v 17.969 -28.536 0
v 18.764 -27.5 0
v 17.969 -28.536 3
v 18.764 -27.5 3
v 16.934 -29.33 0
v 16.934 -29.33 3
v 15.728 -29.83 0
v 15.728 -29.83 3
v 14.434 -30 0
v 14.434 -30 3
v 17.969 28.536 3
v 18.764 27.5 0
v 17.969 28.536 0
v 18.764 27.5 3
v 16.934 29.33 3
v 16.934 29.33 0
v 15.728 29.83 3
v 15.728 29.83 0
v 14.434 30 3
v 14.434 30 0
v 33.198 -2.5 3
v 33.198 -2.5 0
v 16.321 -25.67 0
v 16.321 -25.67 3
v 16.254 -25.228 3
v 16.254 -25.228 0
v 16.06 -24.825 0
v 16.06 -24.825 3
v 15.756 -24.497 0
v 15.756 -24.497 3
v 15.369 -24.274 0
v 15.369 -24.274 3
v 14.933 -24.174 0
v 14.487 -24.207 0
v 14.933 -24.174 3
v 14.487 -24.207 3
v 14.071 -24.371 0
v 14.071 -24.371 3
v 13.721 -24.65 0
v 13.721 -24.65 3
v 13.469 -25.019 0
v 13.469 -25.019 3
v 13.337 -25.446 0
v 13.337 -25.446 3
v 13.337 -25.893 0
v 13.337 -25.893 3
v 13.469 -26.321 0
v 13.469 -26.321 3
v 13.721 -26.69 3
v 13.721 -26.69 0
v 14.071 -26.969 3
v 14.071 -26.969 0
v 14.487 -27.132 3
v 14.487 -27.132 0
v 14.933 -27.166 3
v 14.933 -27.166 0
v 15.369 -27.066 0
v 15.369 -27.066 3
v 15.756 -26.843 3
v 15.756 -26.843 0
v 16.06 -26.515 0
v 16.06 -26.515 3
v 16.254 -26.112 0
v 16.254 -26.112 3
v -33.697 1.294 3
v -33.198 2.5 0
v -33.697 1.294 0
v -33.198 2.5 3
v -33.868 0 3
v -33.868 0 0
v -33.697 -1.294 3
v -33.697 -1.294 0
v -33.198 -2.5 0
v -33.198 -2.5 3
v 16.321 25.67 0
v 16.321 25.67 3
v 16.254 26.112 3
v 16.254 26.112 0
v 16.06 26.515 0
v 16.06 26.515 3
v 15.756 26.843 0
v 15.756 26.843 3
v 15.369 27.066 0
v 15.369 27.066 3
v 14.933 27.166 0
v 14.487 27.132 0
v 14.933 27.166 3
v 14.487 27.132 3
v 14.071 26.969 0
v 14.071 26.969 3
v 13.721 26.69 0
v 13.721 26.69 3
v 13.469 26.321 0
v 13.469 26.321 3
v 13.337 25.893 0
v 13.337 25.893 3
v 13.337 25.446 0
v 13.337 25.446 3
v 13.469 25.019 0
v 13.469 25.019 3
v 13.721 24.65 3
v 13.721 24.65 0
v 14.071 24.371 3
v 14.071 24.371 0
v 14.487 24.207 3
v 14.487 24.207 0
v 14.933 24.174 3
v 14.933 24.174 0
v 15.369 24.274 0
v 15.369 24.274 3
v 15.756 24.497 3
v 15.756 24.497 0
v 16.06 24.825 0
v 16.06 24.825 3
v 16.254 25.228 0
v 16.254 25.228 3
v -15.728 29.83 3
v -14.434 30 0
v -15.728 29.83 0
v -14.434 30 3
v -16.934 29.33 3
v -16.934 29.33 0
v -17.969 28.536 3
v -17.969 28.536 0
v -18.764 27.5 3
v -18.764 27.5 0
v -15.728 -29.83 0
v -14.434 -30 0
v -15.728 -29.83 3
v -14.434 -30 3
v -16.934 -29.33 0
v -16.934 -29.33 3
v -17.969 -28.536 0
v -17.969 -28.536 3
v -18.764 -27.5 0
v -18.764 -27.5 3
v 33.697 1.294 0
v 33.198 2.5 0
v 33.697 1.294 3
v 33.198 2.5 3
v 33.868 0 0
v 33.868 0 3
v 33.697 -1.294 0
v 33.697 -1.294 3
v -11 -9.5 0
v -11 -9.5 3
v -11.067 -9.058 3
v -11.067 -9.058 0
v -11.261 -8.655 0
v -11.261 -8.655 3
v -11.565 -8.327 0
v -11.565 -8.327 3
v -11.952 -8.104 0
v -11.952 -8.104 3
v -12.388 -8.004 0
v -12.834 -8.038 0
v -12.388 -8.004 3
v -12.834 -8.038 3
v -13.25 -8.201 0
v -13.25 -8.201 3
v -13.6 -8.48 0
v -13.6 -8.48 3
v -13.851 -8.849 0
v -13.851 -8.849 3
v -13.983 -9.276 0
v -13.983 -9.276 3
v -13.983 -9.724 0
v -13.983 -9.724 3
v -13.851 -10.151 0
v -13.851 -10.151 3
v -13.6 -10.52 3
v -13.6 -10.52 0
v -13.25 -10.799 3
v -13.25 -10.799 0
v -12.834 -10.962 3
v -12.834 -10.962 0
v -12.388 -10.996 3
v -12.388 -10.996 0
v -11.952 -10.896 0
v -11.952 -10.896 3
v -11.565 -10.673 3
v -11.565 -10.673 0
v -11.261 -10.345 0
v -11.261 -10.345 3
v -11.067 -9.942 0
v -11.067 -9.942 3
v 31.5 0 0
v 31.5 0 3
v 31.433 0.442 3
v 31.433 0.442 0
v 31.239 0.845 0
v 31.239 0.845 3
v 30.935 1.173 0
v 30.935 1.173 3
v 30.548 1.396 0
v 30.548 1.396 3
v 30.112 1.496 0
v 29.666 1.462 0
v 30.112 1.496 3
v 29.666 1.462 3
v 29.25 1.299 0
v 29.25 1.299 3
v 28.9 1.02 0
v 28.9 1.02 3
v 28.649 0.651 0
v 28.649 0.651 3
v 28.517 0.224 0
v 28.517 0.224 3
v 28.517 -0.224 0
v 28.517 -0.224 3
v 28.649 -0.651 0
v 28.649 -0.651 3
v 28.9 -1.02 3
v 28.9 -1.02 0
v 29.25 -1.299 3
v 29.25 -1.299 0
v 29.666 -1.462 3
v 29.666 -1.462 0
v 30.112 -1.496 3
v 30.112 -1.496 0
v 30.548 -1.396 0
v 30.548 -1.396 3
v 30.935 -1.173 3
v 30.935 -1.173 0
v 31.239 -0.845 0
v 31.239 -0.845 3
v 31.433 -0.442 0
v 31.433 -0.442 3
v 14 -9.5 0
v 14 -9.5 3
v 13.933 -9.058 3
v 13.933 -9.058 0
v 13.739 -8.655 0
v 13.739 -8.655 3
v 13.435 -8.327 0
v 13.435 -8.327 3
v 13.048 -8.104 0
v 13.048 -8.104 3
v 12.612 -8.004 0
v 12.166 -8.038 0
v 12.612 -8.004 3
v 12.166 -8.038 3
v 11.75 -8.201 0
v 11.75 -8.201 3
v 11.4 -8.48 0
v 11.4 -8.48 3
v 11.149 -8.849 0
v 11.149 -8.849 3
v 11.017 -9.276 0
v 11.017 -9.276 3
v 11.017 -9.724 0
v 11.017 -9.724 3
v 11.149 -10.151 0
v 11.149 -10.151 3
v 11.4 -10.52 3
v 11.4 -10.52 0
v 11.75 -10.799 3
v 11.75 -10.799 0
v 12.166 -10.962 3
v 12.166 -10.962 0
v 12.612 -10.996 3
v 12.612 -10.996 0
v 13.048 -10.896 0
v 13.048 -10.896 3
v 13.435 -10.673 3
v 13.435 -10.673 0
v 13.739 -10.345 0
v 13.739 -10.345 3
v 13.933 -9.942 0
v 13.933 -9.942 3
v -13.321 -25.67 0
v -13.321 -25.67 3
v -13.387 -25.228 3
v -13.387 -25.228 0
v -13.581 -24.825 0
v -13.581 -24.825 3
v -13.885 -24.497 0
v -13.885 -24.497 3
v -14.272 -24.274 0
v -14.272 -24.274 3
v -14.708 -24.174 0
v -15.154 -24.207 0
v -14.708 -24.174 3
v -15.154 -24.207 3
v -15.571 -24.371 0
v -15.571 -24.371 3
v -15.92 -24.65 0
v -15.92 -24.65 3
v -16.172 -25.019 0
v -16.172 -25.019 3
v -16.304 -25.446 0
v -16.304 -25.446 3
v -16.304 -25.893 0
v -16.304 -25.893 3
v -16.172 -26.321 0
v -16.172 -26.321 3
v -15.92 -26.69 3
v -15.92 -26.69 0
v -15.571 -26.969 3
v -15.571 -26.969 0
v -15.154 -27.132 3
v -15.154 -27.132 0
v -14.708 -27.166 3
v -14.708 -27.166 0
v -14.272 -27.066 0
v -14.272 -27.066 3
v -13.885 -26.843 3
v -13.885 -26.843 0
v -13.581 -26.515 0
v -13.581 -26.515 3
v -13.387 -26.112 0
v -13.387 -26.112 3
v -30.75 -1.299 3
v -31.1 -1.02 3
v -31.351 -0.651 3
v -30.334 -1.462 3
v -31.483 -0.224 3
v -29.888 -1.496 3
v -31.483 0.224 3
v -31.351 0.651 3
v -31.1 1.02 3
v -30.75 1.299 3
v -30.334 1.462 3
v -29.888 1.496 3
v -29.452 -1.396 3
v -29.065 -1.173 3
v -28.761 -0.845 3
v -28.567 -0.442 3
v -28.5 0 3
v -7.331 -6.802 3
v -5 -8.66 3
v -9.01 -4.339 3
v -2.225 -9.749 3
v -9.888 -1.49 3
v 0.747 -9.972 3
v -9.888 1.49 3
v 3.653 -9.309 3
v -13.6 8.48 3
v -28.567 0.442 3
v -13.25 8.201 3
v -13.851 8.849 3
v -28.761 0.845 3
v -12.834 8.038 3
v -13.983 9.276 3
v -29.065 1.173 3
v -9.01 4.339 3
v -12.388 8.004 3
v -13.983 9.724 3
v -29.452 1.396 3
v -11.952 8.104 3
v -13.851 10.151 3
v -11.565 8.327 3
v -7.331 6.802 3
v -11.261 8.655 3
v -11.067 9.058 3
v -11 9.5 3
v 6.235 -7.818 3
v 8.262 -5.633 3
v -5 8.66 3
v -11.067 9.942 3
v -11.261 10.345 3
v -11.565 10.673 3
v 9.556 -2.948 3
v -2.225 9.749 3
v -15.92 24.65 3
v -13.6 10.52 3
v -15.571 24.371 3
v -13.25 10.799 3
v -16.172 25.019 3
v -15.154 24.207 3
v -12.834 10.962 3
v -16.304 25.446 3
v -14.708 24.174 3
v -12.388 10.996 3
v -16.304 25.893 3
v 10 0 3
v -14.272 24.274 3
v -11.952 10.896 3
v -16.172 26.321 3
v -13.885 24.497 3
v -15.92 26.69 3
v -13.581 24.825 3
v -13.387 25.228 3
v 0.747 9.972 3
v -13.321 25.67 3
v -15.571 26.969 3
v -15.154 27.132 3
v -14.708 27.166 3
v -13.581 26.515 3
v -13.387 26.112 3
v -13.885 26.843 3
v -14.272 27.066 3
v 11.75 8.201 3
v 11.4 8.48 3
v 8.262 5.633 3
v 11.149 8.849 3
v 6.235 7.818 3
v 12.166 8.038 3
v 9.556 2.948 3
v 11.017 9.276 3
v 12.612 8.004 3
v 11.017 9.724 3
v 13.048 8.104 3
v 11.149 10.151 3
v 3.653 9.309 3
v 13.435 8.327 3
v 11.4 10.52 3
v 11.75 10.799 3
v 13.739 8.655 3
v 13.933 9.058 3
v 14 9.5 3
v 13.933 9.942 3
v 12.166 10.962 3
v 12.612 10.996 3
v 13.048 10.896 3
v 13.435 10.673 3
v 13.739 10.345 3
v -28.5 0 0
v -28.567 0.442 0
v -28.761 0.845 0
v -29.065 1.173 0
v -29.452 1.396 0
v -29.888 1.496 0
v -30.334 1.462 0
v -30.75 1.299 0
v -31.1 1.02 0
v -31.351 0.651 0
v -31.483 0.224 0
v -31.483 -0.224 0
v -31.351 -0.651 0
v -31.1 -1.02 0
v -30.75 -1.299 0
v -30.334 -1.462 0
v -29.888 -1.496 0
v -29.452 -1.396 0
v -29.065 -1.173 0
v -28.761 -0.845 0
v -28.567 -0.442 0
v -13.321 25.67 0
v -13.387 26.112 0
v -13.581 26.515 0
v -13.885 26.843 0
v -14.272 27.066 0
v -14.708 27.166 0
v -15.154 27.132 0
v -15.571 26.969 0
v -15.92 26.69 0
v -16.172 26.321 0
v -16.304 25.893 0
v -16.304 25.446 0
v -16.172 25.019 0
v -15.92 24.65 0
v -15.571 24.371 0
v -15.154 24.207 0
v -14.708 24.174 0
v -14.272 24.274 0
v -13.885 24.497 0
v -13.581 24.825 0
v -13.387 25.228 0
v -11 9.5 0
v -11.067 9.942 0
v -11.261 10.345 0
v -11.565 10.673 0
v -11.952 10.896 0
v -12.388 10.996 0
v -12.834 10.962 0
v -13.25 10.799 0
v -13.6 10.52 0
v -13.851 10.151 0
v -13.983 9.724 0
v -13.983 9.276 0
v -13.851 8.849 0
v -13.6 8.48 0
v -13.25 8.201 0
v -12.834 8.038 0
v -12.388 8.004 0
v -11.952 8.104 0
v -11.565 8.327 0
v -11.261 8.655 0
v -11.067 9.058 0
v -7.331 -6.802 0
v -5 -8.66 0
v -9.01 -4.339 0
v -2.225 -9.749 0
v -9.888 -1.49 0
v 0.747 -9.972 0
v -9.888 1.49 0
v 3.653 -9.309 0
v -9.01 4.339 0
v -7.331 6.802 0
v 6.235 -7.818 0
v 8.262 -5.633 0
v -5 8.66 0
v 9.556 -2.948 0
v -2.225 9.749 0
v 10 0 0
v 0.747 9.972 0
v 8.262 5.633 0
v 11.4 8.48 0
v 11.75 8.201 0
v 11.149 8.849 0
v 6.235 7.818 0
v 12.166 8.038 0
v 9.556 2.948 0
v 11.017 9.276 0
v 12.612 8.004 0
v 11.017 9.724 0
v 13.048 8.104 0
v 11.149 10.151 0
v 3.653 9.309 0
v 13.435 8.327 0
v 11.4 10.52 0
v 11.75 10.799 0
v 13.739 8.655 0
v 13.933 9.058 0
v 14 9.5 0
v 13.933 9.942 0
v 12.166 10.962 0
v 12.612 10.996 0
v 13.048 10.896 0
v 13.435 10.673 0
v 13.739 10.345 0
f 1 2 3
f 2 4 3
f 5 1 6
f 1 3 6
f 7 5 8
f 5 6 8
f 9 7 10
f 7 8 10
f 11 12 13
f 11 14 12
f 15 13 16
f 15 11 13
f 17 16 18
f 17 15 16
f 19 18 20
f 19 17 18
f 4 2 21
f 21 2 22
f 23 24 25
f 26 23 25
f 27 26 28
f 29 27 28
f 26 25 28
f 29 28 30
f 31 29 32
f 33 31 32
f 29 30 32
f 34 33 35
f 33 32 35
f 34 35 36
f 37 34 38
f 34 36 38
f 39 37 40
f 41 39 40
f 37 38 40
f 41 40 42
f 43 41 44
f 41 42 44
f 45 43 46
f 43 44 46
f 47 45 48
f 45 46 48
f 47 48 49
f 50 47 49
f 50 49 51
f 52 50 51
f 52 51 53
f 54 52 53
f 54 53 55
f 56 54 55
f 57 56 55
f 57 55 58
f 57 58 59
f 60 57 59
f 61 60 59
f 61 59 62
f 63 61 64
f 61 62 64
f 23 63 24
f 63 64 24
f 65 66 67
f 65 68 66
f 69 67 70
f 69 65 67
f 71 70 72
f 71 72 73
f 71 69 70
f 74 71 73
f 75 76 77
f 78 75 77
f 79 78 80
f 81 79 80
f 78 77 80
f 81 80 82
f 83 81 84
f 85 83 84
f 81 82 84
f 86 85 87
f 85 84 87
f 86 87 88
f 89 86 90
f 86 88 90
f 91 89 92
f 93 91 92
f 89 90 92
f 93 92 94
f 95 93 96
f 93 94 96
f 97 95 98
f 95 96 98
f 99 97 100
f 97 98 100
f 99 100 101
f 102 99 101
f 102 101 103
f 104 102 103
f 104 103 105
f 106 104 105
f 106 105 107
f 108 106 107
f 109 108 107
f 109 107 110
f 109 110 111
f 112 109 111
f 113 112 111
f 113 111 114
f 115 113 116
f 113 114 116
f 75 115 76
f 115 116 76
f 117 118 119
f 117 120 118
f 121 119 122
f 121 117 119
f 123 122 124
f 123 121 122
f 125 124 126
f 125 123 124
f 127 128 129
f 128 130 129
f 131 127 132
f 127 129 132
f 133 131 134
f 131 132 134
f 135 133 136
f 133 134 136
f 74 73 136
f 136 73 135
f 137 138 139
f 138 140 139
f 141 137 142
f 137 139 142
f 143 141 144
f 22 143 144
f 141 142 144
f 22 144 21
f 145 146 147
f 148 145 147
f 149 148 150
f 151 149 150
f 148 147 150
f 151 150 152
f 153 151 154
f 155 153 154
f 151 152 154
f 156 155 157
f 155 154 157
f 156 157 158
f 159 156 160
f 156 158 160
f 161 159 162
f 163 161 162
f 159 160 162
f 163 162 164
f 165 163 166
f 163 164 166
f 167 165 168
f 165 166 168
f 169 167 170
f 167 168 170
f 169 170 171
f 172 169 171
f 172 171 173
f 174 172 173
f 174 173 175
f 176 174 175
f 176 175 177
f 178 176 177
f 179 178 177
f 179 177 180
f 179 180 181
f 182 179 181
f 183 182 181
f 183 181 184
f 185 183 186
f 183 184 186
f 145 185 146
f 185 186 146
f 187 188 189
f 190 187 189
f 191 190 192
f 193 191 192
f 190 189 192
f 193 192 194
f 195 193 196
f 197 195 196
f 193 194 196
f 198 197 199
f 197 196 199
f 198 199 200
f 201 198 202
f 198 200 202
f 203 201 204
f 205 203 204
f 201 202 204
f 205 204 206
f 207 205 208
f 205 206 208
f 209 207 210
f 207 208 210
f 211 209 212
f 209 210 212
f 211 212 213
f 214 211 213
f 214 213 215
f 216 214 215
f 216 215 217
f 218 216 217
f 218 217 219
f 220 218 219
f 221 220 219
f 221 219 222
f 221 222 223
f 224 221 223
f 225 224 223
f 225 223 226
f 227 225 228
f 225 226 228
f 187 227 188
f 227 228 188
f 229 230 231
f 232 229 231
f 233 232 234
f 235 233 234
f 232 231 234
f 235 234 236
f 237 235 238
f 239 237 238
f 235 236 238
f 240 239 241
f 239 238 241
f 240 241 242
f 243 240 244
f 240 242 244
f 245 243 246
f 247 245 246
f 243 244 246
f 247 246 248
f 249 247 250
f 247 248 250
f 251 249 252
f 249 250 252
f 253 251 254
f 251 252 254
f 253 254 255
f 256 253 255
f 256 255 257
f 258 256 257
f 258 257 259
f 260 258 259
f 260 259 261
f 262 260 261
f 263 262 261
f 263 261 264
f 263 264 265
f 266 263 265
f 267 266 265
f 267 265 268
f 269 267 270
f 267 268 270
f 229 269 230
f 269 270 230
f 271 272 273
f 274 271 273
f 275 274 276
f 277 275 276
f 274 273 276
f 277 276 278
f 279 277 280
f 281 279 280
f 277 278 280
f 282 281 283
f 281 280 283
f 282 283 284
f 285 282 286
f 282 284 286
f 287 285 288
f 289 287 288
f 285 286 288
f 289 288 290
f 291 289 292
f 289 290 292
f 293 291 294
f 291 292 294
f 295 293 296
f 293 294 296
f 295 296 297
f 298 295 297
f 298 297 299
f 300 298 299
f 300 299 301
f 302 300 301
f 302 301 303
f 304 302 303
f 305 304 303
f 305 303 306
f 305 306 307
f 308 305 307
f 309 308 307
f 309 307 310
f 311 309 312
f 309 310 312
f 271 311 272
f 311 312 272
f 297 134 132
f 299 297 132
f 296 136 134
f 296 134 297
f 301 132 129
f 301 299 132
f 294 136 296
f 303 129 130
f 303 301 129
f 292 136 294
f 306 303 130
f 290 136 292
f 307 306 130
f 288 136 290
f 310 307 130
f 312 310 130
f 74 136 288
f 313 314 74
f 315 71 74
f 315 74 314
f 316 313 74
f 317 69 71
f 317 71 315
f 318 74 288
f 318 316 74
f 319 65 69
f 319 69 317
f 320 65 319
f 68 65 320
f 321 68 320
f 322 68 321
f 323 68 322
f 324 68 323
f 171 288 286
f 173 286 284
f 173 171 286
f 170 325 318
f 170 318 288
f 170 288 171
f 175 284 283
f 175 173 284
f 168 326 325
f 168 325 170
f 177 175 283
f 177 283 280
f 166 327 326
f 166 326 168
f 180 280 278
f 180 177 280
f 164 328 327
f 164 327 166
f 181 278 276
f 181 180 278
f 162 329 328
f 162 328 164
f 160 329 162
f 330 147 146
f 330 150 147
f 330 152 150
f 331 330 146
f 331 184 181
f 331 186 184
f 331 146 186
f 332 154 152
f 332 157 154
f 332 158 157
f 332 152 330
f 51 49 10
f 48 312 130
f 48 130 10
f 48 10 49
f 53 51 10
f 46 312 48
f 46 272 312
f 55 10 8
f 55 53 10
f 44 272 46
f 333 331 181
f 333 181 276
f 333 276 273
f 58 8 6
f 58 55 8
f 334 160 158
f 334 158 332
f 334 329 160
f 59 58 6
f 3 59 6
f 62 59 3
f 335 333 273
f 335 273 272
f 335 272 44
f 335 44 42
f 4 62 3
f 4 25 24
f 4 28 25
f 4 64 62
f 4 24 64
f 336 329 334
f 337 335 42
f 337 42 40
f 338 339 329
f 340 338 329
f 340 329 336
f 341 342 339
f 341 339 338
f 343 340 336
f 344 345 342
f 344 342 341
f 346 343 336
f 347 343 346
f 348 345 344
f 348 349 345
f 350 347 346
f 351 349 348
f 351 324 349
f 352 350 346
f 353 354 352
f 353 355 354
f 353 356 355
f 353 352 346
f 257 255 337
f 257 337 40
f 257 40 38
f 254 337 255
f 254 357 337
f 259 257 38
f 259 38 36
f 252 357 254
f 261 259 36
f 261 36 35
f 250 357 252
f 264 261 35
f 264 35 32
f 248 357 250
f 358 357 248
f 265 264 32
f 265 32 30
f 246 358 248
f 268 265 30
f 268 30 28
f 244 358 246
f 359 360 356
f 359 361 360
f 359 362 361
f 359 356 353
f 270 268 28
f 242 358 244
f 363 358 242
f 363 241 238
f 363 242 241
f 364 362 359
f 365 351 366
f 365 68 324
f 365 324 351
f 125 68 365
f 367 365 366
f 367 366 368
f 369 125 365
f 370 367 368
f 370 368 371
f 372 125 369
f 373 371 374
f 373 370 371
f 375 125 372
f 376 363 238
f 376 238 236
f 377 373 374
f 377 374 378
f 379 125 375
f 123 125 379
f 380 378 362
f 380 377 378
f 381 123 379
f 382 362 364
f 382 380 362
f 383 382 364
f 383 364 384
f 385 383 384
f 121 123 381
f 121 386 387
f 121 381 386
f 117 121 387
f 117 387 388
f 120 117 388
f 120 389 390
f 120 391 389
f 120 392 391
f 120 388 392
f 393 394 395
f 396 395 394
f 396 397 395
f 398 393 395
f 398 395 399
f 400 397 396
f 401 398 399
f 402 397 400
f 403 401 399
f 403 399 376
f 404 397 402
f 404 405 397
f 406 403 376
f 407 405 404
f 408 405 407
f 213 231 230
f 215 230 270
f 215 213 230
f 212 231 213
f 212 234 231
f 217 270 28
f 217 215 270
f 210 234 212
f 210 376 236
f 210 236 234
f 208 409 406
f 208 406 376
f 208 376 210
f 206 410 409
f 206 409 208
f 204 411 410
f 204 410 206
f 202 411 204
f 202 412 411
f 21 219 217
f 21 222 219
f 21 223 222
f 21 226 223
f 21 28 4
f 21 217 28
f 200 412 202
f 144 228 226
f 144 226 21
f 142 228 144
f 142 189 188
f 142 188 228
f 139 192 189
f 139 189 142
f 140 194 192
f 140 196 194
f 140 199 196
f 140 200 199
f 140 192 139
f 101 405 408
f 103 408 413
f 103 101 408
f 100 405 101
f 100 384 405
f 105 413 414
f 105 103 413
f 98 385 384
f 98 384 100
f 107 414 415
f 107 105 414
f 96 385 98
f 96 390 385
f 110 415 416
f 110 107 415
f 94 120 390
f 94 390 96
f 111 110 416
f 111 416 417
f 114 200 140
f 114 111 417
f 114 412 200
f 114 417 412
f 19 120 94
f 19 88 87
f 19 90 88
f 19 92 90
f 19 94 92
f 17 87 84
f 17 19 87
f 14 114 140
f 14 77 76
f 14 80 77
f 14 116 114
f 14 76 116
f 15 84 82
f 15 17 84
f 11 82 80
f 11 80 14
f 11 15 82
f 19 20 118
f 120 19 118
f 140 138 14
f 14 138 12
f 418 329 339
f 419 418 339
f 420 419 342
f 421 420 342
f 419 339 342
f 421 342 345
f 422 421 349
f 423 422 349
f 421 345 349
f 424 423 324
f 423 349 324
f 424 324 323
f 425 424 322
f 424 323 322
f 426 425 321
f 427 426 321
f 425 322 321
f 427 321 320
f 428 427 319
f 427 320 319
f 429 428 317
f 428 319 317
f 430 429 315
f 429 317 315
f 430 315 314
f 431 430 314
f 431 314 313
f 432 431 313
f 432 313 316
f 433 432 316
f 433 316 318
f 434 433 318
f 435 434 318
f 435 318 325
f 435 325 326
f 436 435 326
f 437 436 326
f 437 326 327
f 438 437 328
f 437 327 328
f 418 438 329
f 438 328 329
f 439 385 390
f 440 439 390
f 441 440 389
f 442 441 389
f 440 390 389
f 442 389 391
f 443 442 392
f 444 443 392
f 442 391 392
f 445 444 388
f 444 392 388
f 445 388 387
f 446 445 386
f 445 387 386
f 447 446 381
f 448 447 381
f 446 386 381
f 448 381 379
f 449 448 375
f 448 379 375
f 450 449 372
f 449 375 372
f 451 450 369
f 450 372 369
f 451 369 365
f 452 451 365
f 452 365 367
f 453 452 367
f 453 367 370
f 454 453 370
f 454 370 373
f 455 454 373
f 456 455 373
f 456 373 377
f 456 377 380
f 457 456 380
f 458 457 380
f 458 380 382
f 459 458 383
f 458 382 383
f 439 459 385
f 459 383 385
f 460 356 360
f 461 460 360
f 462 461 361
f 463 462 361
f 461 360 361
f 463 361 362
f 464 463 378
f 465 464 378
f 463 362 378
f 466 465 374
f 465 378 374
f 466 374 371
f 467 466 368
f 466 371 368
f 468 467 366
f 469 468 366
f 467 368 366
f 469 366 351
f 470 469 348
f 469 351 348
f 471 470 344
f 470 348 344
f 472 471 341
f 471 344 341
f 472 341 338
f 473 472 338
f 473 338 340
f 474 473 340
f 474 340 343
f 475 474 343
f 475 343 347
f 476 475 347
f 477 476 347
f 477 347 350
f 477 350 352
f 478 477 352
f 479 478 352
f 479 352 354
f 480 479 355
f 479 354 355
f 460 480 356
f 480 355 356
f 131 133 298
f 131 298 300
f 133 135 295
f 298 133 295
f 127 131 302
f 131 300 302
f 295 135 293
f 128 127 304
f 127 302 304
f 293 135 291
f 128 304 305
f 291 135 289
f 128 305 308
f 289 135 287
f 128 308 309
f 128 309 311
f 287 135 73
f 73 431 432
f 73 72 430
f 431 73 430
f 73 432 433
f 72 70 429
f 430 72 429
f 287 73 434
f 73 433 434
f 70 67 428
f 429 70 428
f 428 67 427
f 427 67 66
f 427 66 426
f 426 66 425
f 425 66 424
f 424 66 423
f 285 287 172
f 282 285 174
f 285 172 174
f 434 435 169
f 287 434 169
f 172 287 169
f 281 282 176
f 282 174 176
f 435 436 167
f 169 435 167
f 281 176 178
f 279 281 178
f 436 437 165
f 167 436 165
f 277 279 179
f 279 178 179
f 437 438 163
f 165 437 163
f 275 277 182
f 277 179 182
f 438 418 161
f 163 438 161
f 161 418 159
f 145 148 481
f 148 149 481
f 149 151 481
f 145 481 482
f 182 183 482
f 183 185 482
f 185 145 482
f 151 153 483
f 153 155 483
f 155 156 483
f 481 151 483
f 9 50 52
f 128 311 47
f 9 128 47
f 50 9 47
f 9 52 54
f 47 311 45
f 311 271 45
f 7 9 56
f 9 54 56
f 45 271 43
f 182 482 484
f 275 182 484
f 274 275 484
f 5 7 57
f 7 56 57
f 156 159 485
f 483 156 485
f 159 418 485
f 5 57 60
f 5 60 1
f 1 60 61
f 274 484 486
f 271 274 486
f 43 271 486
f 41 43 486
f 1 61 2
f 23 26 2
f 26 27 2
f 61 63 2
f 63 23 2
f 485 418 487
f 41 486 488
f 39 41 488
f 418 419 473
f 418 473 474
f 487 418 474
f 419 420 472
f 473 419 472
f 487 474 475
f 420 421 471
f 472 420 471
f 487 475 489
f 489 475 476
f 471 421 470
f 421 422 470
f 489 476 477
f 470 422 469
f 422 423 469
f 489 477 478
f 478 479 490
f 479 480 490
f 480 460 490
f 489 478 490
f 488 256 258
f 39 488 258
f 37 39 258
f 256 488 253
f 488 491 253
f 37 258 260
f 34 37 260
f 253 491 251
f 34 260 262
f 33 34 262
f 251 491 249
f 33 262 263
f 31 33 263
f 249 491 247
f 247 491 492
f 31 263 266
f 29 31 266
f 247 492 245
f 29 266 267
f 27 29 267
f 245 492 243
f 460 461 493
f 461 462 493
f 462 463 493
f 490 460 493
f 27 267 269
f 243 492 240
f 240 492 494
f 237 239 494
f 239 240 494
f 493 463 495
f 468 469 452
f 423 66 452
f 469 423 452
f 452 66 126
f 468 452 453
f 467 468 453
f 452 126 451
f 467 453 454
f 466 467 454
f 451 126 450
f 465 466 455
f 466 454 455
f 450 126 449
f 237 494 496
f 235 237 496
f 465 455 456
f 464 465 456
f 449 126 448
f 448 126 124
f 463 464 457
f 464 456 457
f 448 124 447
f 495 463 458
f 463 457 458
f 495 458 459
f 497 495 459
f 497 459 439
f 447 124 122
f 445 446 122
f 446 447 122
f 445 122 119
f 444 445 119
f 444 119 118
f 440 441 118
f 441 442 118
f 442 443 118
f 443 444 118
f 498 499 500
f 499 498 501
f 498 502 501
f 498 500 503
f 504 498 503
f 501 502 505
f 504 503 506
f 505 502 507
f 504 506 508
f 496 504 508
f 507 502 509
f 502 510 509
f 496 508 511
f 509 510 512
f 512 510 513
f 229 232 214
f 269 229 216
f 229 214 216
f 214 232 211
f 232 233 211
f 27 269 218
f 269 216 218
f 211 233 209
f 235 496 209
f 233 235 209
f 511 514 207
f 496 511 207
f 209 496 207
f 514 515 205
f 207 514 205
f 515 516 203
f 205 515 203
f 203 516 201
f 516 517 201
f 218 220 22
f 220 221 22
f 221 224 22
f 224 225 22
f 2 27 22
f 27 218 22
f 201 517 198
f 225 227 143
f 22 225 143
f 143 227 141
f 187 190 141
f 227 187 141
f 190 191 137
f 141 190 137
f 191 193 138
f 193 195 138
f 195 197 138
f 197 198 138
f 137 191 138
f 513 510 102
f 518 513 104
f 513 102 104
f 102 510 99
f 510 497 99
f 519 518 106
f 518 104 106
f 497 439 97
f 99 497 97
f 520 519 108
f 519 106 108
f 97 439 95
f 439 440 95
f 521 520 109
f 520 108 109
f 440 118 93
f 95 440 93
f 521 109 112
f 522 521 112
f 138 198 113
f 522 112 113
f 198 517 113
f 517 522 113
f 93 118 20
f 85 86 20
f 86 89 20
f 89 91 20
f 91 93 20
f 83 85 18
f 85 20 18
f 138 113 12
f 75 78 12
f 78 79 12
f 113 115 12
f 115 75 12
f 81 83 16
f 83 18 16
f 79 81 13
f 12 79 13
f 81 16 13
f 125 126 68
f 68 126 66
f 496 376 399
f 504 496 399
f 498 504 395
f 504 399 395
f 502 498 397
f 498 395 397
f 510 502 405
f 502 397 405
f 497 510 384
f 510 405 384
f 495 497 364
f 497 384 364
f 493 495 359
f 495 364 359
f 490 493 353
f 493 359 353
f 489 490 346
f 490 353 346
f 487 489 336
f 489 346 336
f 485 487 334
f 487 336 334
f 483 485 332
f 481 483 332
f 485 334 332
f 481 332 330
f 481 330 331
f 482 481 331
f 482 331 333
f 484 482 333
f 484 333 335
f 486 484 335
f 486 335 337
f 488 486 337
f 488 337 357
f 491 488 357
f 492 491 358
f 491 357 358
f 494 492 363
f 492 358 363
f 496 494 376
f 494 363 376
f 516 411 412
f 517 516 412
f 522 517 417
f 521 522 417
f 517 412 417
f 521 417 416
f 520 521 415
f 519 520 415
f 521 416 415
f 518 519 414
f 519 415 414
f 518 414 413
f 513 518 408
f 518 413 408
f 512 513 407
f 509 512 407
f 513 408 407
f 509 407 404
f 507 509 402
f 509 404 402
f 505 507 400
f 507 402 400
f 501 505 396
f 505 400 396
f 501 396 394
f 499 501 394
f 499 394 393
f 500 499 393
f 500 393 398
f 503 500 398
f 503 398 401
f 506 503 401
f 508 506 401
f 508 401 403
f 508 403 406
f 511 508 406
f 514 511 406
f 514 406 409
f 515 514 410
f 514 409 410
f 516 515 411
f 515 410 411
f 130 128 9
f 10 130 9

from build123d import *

# Parameters (mm, degrees)
EXTRUDE_1_DEPTH     = 3
SKETCH_2_R          = 10
SKETCH_2_R_2        = 1.5
CUT_EXTRUDE_1_DEPTH = 3
SKETCH_3_R          = 1.5
CUT_EXTRUDE_2_DEPTH = 3
FILLET_1_R          = 5


with BuildPart() as part:
    # 草图1 → 凸台-拉伸1 (new body)
    with BuildSketch(Plane.XY):
        Polygon((34.641016151, 0), (17.320508076, 30), (-17.320508076, 30), (-34.641016151, 0), (-17.320508076, -30), (17.320508076, -30), align=None)
    extrude(amount=EXTRUDE_1_DEPTH)

    # 草图2 → 切除-拉伸1 (cut)
    with BuildSketch(Plane.XY.offset(3)):
        Circle(SKETCH_2_R)
        with Locations((-12.5, 9.5)):
            Circle(SKETCH_2_R_2)
        with Locations((12.5, 9.5)):
            Circle(SKETCH_2_R_2)
        with Locations((-12.5, -9.5)):
            Circle(SKETCH_2_R_2)
        with Locations((12.5, -9.5)):
            Circle(SKETCH_2_R_2)
    extrude(amount=-CUT_EXTRUDE_1_DEPTH, mode=Mode.SUBTRACT)

    # 草图3 → 切除-拉伸2 (cut)
    with BuildSketch(Plane.XY.offset(3)):
        with Locations((-30, 0)):
            Circle(SKETCH_3_R)
        with Locations((30, 0)):
            Circle(SKETCH_3_R)
        with Locations((-14.820508076, -25.669872981)):
            Circle(SKETCH_3_R)
        with Locations((14.820508076, -25.669872981)):
            Circle(SKETCH_3_R)
        with Locations((-14.820508076, 25.669872981)):
            Circle(SKETCH_3_R)
        with Locations((14.820508076, 25.669872981)):
            Circle(SKETCH_3_R)
    extrude(amount=-CUT_EXTRUDE_2_DEPTH, mode=Mode.SUBTRACT)

    # 圆角1
    fillet_1_edges = [part.edges().sort_by_distance(p)[0] for p in [
        (17.320508076, -30, 1.5),
        (-17.320508076, -30, 1.5),
        (-34.641016151, 0, 1.5),
        (-17.320508076, 30, 1.5),
        (17.320508076, 30, 1.5),
        (34.641016151, 0, 1.5),
    ]]
    fillet(fillet_1_edges, radius=FILLET_1_R)


solid = part.part
